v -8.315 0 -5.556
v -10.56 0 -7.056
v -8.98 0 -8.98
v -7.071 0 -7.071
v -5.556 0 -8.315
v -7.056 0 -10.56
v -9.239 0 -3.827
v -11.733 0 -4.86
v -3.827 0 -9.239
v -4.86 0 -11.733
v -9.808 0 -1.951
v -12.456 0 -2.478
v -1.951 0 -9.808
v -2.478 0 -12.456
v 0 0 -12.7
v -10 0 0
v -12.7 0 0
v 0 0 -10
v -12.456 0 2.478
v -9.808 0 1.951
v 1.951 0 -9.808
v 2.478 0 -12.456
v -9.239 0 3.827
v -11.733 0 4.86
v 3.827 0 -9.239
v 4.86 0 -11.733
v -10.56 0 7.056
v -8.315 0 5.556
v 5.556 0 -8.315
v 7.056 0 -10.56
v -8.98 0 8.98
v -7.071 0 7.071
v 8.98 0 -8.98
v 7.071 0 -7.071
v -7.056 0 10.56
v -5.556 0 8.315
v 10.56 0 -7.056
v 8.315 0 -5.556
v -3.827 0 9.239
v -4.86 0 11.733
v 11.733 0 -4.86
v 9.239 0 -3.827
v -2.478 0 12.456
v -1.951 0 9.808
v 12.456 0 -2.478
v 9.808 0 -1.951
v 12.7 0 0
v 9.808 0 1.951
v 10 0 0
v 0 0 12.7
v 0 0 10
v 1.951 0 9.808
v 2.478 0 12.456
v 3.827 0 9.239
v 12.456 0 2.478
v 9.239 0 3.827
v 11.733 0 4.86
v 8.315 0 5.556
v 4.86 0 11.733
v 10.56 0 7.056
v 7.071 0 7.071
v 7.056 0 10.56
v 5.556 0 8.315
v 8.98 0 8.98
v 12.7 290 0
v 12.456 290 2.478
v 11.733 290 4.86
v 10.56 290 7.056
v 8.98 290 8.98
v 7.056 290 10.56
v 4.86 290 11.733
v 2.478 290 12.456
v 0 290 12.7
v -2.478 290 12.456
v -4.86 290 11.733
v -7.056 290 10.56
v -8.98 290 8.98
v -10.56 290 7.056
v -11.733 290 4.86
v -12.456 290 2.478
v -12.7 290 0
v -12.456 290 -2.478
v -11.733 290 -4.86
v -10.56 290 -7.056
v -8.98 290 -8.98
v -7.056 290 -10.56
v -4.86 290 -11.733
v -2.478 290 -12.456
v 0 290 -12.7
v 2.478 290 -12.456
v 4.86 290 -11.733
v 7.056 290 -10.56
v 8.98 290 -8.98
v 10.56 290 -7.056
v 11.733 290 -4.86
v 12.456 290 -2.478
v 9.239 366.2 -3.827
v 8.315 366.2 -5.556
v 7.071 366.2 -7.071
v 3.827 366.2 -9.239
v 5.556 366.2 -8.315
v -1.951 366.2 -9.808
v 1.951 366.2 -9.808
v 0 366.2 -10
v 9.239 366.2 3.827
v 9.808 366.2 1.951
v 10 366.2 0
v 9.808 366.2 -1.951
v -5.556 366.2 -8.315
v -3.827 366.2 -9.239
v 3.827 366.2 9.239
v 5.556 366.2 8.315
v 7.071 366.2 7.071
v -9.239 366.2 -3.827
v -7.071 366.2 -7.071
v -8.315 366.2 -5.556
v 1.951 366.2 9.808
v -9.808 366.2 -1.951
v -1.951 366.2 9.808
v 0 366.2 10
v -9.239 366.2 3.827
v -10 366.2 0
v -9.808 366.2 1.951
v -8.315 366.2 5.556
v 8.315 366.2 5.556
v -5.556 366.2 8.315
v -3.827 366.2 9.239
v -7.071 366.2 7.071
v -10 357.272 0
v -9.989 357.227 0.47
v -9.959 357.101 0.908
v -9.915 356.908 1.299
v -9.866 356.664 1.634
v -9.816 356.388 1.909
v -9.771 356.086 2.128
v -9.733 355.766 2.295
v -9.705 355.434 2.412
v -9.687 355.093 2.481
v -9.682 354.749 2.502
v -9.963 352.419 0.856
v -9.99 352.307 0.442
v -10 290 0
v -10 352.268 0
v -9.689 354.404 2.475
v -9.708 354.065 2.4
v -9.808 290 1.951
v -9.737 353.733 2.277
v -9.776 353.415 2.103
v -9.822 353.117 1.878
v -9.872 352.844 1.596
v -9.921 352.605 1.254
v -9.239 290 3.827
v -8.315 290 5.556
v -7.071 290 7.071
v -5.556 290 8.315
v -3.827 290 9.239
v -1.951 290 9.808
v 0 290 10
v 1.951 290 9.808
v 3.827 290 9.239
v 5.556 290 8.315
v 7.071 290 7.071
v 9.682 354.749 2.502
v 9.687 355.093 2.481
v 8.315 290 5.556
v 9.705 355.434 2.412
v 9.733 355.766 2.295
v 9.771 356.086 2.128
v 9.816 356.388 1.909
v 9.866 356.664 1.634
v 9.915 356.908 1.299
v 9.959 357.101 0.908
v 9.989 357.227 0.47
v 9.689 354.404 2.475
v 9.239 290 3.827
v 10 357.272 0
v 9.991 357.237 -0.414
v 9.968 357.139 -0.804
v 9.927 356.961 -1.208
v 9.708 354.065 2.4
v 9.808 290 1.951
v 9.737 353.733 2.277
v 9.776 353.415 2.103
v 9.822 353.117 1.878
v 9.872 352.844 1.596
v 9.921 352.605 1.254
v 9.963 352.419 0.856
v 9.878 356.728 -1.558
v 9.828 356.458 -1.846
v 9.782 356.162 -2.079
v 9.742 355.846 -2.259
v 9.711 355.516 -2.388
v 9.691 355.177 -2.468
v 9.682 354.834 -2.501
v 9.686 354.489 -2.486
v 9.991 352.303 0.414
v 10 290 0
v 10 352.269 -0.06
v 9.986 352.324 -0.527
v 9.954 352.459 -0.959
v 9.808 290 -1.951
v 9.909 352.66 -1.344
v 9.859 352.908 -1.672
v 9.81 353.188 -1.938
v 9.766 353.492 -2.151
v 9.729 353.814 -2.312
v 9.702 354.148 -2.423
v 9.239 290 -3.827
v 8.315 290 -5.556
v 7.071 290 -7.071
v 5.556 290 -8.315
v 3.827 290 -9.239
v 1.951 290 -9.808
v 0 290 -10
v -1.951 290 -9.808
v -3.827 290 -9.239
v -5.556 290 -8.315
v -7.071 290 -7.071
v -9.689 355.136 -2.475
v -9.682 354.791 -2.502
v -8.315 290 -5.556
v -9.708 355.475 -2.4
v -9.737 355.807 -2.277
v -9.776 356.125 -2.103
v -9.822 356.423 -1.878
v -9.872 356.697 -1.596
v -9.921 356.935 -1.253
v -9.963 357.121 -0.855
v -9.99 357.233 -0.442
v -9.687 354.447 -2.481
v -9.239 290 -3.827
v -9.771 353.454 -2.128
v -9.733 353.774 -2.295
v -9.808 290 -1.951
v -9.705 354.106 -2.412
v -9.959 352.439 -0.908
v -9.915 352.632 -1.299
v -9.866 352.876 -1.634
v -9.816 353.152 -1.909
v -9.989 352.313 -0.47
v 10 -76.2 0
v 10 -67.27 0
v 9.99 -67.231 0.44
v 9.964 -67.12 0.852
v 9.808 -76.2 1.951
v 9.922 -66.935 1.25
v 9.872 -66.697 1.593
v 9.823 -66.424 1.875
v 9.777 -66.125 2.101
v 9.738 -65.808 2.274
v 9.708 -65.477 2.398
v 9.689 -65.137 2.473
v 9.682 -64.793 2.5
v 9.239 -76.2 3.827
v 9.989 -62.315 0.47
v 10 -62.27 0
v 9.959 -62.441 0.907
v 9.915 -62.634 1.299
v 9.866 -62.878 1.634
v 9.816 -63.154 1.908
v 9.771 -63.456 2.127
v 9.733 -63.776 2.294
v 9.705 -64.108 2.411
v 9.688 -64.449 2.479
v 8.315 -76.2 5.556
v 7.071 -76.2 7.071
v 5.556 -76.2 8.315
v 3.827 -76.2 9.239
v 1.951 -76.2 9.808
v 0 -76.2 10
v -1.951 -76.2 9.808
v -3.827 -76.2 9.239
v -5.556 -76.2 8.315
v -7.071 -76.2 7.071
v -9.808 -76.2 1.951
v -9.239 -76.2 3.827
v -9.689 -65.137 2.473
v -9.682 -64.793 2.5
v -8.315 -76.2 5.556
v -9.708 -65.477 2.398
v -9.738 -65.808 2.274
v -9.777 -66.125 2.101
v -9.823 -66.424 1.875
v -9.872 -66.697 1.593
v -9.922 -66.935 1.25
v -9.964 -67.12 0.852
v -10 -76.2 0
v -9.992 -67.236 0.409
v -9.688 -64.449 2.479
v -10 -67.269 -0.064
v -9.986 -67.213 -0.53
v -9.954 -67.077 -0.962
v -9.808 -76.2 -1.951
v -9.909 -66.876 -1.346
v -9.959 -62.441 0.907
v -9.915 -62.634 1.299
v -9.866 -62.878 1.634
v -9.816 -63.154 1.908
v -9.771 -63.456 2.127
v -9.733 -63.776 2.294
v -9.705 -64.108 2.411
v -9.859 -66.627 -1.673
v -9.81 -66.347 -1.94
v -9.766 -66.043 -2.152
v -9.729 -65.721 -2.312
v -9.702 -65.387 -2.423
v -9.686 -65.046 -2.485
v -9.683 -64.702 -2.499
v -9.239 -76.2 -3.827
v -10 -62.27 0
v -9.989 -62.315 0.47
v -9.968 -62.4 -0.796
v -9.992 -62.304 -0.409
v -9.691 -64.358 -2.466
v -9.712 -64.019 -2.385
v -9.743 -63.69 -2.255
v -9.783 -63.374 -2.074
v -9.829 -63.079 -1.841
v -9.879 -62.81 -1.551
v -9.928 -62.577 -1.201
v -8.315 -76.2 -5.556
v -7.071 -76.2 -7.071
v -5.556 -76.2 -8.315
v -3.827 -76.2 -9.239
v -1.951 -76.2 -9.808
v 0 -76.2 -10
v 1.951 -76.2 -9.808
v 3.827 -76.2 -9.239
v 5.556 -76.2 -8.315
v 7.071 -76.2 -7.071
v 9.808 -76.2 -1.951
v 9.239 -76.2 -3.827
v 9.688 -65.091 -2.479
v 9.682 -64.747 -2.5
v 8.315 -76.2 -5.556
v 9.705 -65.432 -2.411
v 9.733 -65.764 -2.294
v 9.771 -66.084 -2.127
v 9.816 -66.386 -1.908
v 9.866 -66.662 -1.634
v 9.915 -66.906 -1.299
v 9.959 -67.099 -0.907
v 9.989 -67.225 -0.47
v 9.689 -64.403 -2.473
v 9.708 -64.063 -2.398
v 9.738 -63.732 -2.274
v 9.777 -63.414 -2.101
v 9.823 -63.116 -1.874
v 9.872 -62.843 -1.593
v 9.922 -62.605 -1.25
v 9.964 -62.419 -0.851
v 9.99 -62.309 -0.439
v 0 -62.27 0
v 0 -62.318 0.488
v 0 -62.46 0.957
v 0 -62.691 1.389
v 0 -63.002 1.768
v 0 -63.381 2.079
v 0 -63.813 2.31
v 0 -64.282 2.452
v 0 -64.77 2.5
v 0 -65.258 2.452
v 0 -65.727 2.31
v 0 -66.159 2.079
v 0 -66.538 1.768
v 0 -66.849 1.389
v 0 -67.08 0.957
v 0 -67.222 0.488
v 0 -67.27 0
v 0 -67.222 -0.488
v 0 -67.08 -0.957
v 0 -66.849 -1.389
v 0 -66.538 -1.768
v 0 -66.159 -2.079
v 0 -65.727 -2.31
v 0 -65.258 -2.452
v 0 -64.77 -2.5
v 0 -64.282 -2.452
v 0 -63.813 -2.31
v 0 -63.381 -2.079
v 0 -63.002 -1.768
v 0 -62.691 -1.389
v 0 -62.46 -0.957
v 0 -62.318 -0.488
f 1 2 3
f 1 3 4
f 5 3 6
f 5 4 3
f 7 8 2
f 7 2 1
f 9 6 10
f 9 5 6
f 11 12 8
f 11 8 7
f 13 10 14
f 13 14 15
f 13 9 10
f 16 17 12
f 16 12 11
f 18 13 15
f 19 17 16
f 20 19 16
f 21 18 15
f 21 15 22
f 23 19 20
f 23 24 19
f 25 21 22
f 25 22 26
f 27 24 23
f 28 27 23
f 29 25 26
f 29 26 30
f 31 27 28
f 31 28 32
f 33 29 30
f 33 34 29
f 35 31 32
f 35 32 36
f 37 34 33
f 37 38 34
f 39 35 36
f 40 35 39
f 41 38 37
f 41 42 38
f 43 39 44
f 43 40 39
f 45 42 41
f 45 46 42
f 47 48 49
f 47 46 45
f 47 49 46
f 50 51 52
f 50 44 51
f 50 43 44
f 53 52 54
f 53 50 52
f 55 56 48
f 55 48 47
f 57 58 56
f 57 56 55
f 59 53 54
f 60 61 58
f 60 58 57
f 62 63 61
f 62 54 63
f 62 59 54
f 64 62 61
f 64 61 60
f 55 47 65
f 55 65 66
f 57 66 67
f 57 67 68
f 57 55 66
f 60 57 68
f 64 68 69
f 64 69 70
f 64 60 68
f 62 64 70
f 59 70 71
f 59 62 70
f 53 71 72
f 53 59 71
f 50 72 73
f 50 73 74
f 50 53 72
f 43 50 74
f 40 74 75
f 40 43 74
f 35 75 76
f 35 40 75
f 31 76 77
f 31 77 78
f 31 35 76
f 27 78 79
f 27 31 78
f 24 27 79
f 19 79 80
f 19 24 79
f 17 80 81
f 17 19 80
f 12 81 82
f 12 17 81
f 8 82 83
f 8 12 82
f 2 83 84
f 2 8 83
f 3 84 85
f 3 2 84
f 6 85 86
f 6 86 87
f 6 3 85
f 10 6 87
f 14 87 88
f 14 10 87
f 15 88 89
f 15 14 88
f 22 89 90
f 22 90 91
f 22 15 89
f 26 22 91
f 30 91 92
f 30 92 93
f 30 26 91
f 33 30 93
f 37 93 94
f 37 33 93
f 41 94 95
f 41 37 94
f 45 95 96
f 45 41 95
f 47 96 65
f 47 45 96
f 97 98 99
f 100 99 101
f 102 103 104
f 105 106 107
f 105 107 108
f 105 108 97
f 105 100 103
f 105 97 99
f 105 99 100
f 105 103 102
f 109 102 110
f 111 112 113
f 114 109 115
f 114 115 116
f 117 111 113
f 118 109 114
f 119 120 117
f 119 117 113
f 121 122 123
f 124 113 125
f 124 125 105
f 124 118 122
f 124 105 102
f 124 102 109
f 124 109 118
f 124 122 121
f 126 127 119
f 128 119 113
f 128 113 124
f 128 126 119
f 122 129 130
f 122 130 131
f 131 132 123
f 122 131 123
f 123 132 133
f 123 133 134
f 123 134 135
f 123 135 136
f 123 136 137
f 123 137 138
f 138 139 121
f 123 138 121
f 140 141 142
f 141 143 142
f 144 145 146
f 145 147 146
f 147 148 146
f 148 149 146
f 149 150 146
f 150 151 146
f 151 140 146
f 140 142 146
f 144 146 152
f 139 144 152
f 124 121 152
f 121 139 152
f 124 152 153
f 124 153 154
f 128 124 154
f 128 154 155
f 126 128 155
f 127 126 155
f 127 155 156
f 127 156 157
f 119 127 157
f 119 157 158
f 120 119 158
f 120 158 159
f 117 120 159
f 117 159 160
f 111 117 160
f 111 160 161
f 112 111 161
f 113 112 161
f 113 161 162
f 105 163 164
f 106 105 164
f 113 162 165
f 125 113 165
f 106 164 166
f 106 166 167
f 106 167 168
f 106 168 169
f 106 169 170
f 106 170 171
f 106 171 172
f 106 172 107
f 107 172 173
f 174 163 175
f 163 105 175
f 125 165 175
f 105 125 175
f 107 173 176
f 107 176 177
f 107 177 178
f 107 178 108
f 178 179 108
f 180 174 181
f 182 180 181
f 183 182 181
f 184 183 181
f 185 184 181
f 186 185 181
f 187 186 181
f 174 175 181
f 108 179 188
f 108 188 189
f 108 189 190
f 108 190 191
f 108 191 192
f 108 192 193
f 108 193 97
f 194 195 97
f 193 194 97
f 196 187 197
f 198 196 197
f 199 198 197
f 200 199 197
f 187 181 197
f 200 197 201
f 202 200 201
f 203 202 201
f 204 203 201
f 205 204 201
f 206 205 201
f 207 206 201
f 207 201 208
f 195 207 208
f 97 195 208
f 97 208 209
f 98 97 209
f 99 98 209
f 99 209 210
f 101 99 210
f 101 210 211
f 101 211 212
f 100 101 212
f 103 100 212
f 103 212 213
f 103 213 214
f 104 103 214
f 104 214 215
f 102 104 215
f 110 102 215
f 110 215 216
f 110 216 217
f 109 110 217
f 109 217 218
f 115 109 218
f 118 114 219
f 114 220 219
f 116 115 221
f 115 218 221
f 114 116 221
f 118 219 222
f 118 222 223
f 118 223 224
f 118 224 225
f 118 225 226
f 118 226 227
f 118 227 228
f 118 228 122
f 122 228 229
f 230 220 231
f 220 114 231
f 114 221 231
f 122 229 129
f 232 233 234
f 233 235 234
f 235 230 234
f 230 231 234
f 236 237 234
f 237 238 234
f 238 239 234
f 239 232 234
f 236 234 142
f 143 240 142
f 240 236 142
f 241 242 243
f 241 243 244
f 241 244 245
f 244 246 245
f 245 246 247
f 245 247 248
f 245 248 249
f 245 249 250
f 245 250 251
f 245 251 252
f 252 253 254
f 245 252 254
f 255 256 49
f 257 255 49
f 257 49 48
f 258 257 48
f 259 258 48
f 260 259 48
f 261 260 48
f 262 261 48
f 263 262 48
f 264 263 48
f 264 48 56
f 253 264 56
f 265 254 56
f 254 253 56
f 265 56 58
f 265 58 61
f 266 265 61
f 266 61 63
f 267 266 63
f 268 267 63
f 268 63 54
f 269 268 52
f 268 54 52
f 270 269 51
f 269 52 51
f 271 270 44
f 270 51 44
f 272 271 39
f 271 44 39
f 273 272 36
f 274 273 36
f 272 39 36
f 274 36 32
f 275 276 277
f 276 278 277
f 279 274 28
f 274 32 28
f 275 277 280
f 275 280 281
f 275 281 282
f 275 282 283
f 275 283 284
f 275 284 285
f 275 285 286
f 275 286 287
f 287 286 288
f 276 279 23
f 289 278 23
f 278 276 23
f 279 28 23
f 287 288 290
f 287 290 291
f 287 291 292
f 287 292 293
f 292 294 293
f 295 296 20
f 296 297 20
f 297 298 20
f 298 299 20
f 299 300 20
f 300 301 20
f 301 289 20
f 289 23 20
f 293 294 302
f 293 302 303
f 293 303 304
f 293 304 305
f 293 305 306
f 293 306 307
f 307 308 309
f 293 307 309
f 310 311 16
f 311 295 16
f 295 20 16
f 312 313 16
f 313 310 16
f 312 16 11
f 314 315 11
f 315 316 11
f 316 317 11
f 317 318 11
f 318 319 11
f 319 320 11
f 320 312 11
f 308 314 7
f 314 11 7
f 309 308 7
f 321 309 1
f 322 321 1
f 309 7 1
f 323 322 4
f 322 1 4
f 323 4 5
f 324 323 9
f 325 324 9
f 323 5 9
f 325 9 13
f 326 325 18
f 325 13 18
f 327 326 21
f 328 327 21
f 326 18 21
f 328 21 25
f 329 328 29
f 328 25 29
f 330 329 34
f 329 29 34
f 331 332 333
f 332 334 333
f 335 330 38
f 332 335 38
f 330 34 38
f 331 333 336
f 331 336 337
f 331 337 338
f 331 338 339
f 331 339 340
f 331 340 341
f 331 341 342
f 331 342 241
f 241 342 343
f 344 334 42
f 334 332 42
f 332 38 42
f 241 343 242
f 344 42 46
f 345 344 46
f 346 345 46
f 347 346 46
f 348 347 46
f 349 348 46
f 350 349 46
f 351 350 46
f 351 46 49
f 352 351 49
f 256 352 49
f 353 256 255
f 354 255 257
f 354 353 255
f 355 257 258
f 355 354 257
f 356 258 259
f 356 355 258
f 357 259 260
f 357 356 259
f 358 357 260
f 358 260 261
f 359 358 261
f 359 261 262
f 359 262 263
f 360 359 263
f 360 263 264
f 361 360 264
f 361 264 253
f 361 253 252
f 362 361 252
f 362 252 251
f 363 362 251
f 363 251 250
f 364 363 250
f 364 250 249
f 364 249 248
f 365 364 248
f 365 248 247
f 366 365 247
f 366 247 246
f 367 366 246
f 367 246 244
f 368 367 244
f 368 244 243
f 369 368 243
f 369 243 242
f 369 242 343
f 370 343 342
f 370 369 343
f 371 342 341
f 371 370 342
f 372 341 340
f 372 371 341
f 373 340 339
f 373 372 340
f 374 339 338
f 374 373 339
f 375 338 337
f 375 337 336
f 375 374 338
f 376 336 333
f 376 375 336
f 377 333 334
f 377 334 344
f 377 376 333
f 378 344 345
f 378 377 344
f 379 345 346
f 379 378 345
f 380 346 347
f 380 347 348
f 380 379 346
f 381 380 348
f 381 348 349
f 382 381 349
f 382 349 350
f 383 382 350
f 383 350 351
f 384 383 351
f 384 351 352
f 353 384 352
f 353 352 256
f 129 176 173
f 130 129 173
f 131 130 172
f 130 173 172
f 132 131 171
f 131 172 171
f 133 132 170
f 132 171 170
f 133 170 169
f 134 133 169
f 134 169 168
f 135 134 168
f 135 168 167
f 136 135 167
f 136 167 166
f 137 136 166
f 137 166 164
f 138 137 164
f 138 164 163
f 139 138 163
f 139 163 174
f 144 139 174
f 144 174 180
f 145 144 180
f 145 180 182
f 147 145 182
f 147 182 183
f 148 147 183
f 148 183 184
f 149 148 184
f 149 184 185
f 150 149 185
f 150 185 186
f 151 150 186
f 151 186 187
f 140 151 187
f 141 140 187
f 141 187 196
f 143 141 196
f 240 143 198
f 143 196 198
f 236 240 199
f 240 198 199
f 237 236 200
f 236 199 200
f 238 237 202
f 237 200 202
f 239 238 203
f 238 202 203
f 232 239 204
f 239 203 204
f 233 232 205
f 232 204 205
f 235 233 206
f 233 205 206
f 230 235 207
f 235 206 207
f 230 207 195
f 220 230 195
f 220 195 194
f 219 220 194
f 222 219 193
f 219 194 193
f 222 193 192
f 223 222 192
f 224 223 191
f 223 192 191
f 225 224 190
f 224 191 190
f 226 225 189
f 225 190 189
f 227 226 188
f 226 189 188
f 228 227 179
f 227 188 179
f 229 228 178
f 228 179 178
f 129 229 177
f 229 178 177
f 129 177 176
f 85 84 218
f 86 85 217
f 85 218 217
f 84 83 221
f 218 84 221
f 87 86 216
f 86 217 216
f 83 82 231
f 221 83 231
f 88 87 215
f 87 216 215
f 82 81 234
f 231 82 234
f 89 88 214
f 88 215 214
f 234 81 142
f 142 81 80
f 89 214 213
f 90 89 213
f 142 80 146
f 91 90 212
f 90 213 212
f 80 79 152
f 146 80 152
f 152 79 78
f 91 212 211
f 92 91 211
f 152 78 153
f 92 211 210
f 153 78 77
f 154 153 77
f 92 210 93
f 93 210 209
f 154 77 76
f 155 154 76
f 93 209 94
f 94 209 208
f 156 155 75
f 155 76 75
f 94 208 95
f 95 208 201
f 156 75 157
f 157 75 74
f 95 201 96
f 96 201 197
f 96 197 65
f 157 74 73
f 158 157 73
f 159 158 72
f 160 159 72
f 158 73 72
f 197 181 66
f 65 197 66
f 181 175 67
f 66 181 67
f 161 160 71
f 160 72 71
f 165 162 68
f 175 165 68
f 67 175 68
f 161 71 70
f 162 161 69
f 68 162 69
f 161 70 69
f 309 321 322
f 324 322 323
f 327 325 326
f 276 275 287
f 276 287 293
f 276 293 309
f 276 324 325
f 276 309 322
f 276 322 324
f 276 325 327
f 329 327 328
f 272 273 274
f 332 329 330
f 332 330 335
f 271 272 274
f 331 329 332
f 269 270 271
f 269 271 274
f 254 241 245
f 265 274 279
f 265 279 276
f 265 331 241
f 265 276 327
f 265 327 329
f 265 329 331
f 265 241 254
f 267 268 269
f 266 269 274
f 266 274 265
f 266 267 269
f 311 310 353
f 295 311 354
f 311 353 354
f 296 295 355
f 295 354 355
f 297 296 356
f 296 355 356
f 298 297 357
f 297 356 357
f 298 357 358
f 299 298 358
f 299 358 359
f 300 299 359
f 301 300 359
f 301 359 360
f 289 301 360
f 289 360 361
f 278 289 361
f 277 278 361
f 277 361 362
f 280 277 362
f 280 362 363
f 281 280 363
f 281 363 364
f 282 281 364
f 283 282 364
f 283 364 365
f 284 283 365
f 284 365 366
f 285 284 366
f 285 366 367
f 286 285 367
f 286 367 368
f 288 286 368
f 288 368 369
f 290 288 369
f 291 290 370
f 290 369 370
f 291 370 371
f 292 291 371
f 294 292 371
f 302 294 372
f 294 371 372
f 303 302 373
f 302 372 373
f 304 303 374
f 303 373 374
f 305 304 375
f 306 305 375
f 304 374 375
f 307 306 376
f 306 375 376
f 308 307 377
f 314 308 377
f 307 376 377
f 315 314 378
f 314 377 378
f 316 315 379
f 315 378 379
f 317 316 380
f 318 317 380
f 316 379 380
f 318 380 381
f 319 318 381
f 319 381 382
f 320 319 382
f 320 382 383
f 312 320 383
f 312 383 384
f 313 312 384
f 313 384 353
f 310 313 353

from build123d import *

# Parameters (mm, degrees)
F0_R     = 12.7
F0_R_2   = 10
F1_DEPTH = 290
F2_DEPTH = 76.2
F3_R     = 10
F4_DEPTH = 76.2
F5_R     = 2.5
F5_R_2   = 2.5019
F6_DEPTH = 63.5


with BuildPart() as f1:
    # F0 (on Front) → F1 (new body)
    with BuildSketch(Plane.XZ):
        Circle(F0_R)
        Circle(F0_R_2, mode=Mode.SUBTRACT)
        Circle(F0_R_2)
    extrude(amount=-F1_DEPTH)

    # F0 (on Front) → F2 (join)
    with BuildSketch(Plane.XZ):
        Circle(F0_R_2)
    extrude(amount=F2_DEPTH)

    # F3 (on face) → F4 (join)
    with BuildSketch(Plane(origin=(0, 290, 0), x_dir=(-1, 0, 0), z_dir=(0, 1, 0))):
        Circle(F3_R)
    extrude(amount=F4_DEPTH)

    # F5 (on Right) → F6 (cut, symmetric)
    with BuildSketch(Plane.YZ):
        with Locations((-64.77, 0)):
            Circle(F5_R)
        with Locations((354.77, 0)):
            Circle(F5_R_2)
    extrude(amount=F6_DEPTH, both=True, mode=Mode.SUBTRACT)


solid = f1.part
